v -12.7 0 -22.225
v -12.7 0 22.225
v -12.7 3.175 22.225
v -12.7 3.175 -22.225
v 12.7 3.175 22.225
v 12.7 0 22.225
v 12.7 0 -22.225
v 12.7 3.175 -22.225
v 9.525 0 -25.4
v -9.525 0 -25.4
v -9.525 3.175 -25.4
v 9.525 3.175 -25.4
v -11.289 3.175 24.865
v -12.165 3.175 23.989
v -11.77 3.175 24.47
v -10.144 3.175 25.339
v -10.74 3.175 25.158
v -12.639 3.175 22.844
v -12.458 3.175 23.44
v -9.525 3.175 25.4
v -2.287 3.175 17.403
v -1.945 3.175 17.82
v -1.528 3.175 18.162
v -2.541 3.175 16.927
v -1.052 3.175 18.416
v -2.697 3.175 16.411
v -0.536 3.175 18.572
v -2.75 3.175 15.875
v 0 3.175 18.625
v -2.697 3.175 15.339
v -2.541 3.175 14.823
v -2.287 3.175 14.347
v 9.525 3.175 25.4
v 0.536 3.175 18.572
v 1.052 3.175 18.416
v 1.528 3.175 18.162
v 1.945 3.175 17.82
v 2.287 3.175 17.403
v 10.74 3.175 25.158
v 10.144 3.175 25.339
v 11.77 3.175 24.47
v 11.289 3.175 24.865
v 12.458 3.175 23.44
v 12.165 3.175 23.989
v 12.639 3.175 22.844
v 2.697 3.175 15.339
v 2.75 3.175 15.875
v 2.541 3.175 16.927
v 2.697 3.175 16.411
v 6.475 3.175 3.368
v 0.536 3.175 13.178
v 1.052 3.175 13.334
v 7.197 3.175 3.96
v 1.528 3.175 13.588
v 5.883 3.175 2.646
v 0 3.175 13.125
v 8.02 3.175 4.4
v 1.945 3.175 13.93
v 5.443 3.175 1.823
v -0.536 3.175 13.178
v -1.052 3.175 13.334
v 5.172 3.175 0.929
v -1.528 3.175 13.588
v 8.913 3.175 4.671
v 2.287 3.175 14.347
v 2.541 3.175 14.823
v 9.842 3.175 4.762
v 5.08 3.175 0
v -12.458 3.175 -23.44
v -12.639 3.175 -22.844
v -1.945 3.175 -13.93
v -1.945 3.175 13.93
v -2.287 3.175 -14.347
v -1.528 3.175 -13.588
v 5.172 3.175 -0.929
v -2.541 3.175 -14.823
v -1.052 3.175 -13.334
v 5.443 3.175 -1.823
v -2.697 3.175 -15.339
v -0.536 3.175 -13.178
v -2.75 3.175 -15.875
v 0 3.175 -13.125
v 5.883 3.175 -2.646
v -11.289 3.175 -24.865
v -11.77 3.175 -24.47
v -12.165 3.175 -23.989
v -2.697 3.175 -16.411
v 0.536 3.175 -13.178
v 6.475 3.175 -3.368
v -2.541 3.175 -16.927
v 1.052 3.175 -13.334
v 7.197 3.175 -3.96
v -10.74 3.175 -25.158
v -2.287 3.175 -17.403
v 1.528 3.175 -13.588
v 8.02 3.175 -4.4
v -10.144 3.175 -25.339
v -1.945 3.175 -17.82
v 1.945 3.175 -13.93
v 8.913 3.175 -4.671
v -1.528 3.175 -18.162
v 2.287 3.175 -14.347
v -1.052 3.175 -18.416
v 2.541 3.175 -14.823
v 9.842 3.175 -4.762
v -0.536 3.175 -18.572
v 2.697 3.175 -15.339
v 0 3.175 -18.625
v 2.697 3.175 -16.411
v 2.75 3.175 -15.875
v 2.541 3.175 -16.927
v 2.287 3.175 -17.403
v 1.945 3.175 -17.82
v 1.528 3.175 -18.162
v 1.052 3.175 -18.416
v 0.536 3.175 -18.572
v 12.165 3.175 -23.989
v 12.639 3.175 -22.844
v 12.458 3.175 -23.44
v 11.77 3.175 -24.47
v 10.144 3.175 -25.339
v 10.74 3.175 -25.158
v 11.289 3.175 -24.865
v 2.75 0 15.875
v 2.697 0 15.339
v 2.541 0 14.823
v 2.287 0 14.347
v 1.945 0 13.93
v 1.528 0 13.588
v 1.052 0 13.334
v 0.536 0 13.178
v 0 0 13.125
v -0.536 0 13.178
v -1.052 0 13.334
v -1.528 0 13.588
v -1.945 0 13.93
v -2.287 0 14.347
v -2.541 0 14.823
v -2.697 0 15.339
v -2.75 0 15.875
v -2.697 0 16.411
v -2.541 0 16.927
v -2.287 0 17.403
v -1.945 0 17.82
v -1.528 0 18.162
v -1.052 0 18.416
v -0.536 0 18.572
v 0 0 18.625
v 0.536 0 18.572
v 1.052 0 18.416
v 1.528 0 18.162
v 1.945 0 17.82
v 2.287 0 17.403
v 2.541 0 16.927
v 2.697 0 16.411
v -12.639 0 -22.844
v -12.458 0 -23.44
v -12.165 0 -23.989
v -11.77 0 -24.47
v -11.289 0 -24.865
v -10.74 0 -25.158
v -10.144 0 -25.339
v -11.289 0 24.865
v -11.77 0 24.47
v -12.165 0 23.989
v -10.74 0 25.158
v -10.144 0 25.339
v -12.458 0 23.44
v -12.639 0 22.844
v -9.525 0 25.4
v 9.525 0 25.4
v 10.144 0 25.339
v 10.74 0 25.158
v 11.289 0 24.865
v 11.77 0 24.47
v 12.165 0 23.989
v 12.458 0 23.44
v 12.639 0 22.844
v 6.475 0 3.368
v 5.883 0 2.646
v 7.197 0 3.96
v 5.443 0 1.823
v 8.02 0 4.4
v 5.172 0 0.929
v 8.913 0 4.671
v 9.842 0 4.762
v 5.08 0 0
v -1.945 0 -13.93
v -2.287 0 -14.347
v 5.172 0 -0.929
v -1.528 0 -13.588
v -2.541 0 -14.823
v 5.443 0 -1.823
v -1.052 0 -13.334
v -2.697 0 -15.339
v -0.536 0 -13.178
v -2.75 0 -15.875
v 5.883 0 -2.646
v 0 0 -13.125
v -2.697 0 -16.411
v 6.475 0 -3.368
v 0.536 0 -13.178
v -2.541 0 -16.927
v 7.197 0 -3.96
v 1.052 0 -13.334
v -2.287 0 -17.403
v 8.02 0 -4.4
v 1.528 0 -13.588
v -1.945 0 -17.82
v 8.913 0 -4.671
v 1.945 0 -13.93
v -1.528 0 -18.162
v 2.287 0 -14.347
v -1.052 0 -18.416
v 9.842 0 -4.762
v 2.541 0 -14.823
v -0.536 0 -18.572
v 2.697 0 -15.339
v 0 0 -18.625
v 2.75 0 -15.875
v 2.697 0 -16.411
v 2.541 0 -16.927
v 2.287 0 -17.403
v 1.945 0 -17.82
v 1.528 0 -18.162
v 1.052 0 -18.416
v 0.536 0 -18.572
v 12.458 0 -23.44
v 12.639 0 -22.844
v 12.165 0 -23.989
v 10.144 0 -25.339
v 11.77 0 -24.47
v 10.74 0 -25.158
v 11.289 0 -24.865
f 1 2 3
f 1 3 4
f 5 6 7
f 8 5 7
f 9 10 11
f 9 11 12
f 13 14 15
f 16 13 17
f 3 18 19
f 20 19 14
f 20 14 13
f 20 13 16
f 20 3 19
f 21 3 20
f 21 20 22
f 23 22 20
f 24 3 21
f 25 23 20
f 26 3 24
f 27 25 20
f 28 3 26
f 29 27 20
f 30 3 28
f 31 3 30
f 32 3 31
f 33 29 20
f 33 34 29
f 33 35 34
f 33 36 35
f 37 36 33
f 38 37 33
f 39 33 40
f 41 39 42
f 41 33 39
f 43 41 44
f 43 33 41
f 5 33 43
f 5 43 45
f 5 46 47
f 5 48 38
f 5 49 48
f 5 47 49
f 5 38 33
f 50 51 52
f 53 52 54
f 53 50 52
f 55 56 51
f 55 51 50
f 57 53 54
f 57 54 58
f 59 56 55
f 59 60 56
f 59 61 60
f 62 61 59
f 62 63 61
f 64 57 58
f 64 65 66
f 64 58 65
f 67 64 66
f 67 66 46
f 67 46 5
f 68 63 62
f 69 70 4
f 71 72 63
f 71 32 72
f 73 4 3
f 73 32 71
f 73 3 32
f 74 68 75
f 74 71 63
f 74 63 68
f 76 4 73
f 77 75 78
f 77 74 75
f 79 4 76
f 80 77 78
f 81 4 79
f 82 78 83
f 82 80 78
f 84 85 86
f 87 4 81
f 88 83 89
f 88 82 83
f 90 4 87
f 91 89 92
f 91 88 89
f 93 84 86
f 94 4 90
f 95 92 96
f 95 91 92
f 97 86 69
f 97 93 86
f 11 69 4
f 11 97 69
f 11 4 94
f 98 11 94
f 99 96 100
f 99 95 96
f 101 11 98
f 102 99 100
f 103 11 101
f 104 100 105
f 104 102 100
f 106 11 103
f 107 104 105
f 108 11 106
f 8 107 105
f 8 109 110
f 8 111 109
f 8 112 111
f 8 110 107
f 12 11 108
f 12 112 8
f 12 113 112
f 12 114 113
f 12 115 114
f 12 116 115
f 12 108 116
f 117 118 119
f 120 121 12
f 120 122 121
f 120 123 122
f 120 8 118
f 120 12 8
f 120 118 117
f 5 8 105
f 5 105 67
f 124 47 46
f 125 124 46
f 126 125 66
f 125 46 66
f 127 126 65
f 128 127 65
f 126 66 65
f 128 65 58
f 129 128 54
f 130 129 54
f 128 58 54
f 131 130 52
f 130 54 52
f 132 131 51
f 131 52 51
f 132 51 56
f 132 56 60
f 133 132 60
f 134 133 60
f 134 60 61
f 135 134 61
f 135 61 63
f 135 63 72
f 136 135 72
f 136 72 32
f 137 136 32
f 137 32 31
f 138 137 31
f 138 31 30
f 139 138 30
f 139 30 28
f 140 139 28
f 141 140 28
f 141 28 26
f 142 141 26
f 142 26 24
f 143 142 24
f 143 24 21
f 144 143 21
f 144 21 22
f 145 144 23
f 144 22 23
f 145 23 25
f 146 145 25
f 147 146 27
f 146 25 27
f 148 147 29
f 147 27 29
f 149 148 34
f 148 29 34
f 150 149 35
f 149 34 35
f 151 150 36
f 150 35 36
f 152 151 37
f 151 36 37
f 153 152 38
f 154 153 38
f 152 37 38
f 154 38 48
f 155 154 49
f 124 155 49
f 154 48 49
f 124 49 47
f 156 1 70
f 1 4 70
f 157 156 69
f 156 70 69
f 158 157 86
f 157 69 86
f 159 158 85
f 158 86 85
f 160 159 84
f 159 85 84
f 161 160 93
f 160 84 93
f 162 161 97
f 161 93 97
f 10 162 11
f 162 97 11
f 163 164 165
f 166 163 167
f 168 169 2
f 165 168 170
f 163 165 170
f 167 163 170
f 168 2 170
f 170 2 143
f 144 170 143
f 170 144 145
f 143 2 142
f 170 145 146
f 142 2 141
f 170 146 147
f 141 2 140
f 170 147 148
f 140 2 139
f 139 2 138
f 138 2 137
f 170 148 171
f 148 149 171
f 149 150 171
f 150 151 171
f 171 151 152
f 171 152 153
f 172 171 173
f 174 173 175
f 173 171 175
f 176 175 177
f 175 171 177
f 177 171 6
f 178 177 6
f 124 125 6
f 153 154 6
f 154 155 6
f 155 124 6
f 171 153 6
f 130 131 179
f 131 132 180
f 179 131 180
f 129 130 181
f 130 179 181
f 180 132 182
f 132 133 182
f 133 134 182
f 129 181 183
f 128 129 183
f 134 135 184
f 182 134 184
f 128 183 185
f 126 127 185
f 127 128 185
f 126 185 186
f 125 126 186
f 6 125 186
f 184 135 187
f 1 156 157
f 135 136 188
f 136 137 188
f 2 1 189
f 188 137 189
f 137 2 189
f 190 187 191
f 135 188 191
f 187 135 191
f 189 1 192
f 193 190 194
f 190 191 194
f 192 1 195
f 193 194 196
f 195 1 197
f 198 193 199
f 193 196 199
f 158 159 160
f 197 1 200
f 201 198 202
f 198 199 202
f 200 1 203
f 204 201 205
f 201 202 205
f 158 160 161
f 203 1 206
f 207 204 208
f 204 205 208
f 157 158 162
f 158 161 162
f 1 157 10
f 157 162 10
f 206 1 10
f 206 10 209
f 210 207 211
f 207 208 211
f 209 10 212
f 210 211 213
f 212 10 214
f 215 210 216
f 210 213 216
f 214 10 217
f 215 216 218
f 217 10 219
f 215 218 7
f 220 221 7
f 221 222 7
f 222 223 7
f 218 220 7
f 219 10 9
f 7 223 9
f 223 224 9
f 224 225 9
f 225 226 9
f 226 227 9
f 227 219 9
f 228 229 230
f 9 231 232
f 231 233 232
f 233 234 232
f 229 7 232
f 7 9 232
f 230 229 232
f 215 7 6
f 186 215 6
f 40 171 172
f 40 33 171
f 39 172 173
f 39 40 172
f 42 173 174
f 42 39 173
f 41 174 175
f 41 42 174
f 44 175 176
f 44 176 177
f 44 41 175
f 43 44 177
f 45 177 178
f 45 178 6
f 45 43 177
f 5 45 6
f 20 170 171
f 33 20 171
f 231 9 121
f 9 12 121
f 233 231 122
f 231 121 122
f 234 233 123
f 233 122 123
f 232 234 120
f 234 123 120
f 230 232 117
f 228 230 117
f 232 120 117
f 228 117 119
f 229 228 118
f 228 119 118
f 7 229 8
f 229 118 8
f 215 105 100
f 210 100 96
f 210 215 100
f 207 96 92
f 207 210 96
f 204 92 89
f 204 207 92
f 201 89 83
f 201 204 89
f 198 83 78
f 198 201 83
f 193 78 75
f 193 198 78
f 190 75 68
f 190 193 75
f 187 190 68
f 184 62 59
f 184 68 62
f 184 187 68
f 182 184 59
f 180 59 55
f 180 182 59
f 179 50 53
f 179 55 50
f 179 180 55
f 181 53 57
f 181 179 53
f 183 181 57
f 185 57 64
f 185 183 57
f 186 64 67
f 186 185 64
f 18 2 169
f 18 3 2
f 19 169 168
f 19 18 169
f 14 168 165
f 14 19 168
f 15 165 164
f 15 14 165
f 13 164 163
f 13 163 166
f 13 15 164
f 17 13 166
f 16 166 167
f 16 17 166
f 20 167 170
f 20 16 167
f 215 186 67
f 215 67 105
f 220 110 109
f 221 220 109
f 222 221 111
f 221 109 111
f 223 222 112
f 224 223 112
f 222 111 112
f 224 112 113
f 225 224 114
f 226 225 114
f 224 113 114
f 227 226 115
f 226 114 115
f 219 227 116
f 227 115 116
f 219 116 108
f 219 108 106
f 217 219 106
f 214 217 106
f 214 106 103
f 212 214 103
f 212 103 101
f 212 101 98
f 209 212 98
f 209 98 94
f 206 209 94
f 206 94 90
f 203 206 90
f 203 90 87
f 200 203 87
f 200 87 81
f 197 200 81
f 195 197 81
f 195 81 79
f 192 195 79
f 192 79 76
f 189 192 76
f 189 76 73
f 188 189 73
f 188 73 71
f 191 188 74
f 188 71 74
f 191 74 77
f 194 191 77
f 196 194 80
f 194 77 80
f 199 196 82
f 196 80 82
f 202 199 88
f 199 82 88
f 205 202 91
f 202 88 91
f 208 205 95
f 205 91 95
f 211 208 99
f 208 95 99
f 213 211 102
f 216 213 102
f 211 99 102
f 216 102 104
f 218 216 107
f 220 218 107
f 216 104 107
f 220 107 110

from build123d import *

# Parameters (mm, degrees)
SKETCH1_W            = 25.4
SKETCH1_H            = 50.8
BOSS_EXTRUDE1_DEPTH  = 3.175
CUT_EXTRUDE2_DEPTH   = 29.575
M5_CLEARANCE_HOLE1_D = 5.5
FILLET1_R            = 3.175


with BuildPart() as part:
    # Sketch1 → Boss-Extrude1 (new body)
    with BuildSketch(Plane(origin=(0, 0, 0), x_dir=(1, 0, 0), z_dir=(0, 1, 0))):
        Rectangle(SKETCH1_W, SKETCH1_H)
    extrude(amount=BOSS_EXTRUDE1_DEPTH)

    # Sketch8 → Cut-Extrude2 (cut, through all)
    with BuildSketch(Plane.XZ):
        with BuildLine():
            Line((9.8425, 4.7625), (9.8425, -4.7625))
            ThreePointArc((9.8425, -4.7625), (5.08, 0), (9.8425, 4.7625))
        make_face()
    extrude(amount=-CUT_EXTRUDE2_DEPTH, mode=Mode.SUBTRACT)

    # M5 Clearance Hole1 (through all)
    with Locations(Plane(origin=(0, 0, 0), x_dir=(-1, 0, 0), z_dir=(0, -1, 0))):
        with Locations((0, 15.875), (0, -15.875)):
            Hole(M5_CLEARANCE_HOLE1_D / 2)

    # Fillet1
    fillet1_edges = [part.edges().sort_by_distance(p)[0] for p in [
        (12.7, 1.5875, 25.4),
        (-12.7, 1.5875, 25.4),
        (-12.7, 1.5875, -25.4),
        (12.7, 1.5875, -25.4),
    ]]
    fillet(fillet1_edges, radius=FILLET1_R)


solid = part.part
